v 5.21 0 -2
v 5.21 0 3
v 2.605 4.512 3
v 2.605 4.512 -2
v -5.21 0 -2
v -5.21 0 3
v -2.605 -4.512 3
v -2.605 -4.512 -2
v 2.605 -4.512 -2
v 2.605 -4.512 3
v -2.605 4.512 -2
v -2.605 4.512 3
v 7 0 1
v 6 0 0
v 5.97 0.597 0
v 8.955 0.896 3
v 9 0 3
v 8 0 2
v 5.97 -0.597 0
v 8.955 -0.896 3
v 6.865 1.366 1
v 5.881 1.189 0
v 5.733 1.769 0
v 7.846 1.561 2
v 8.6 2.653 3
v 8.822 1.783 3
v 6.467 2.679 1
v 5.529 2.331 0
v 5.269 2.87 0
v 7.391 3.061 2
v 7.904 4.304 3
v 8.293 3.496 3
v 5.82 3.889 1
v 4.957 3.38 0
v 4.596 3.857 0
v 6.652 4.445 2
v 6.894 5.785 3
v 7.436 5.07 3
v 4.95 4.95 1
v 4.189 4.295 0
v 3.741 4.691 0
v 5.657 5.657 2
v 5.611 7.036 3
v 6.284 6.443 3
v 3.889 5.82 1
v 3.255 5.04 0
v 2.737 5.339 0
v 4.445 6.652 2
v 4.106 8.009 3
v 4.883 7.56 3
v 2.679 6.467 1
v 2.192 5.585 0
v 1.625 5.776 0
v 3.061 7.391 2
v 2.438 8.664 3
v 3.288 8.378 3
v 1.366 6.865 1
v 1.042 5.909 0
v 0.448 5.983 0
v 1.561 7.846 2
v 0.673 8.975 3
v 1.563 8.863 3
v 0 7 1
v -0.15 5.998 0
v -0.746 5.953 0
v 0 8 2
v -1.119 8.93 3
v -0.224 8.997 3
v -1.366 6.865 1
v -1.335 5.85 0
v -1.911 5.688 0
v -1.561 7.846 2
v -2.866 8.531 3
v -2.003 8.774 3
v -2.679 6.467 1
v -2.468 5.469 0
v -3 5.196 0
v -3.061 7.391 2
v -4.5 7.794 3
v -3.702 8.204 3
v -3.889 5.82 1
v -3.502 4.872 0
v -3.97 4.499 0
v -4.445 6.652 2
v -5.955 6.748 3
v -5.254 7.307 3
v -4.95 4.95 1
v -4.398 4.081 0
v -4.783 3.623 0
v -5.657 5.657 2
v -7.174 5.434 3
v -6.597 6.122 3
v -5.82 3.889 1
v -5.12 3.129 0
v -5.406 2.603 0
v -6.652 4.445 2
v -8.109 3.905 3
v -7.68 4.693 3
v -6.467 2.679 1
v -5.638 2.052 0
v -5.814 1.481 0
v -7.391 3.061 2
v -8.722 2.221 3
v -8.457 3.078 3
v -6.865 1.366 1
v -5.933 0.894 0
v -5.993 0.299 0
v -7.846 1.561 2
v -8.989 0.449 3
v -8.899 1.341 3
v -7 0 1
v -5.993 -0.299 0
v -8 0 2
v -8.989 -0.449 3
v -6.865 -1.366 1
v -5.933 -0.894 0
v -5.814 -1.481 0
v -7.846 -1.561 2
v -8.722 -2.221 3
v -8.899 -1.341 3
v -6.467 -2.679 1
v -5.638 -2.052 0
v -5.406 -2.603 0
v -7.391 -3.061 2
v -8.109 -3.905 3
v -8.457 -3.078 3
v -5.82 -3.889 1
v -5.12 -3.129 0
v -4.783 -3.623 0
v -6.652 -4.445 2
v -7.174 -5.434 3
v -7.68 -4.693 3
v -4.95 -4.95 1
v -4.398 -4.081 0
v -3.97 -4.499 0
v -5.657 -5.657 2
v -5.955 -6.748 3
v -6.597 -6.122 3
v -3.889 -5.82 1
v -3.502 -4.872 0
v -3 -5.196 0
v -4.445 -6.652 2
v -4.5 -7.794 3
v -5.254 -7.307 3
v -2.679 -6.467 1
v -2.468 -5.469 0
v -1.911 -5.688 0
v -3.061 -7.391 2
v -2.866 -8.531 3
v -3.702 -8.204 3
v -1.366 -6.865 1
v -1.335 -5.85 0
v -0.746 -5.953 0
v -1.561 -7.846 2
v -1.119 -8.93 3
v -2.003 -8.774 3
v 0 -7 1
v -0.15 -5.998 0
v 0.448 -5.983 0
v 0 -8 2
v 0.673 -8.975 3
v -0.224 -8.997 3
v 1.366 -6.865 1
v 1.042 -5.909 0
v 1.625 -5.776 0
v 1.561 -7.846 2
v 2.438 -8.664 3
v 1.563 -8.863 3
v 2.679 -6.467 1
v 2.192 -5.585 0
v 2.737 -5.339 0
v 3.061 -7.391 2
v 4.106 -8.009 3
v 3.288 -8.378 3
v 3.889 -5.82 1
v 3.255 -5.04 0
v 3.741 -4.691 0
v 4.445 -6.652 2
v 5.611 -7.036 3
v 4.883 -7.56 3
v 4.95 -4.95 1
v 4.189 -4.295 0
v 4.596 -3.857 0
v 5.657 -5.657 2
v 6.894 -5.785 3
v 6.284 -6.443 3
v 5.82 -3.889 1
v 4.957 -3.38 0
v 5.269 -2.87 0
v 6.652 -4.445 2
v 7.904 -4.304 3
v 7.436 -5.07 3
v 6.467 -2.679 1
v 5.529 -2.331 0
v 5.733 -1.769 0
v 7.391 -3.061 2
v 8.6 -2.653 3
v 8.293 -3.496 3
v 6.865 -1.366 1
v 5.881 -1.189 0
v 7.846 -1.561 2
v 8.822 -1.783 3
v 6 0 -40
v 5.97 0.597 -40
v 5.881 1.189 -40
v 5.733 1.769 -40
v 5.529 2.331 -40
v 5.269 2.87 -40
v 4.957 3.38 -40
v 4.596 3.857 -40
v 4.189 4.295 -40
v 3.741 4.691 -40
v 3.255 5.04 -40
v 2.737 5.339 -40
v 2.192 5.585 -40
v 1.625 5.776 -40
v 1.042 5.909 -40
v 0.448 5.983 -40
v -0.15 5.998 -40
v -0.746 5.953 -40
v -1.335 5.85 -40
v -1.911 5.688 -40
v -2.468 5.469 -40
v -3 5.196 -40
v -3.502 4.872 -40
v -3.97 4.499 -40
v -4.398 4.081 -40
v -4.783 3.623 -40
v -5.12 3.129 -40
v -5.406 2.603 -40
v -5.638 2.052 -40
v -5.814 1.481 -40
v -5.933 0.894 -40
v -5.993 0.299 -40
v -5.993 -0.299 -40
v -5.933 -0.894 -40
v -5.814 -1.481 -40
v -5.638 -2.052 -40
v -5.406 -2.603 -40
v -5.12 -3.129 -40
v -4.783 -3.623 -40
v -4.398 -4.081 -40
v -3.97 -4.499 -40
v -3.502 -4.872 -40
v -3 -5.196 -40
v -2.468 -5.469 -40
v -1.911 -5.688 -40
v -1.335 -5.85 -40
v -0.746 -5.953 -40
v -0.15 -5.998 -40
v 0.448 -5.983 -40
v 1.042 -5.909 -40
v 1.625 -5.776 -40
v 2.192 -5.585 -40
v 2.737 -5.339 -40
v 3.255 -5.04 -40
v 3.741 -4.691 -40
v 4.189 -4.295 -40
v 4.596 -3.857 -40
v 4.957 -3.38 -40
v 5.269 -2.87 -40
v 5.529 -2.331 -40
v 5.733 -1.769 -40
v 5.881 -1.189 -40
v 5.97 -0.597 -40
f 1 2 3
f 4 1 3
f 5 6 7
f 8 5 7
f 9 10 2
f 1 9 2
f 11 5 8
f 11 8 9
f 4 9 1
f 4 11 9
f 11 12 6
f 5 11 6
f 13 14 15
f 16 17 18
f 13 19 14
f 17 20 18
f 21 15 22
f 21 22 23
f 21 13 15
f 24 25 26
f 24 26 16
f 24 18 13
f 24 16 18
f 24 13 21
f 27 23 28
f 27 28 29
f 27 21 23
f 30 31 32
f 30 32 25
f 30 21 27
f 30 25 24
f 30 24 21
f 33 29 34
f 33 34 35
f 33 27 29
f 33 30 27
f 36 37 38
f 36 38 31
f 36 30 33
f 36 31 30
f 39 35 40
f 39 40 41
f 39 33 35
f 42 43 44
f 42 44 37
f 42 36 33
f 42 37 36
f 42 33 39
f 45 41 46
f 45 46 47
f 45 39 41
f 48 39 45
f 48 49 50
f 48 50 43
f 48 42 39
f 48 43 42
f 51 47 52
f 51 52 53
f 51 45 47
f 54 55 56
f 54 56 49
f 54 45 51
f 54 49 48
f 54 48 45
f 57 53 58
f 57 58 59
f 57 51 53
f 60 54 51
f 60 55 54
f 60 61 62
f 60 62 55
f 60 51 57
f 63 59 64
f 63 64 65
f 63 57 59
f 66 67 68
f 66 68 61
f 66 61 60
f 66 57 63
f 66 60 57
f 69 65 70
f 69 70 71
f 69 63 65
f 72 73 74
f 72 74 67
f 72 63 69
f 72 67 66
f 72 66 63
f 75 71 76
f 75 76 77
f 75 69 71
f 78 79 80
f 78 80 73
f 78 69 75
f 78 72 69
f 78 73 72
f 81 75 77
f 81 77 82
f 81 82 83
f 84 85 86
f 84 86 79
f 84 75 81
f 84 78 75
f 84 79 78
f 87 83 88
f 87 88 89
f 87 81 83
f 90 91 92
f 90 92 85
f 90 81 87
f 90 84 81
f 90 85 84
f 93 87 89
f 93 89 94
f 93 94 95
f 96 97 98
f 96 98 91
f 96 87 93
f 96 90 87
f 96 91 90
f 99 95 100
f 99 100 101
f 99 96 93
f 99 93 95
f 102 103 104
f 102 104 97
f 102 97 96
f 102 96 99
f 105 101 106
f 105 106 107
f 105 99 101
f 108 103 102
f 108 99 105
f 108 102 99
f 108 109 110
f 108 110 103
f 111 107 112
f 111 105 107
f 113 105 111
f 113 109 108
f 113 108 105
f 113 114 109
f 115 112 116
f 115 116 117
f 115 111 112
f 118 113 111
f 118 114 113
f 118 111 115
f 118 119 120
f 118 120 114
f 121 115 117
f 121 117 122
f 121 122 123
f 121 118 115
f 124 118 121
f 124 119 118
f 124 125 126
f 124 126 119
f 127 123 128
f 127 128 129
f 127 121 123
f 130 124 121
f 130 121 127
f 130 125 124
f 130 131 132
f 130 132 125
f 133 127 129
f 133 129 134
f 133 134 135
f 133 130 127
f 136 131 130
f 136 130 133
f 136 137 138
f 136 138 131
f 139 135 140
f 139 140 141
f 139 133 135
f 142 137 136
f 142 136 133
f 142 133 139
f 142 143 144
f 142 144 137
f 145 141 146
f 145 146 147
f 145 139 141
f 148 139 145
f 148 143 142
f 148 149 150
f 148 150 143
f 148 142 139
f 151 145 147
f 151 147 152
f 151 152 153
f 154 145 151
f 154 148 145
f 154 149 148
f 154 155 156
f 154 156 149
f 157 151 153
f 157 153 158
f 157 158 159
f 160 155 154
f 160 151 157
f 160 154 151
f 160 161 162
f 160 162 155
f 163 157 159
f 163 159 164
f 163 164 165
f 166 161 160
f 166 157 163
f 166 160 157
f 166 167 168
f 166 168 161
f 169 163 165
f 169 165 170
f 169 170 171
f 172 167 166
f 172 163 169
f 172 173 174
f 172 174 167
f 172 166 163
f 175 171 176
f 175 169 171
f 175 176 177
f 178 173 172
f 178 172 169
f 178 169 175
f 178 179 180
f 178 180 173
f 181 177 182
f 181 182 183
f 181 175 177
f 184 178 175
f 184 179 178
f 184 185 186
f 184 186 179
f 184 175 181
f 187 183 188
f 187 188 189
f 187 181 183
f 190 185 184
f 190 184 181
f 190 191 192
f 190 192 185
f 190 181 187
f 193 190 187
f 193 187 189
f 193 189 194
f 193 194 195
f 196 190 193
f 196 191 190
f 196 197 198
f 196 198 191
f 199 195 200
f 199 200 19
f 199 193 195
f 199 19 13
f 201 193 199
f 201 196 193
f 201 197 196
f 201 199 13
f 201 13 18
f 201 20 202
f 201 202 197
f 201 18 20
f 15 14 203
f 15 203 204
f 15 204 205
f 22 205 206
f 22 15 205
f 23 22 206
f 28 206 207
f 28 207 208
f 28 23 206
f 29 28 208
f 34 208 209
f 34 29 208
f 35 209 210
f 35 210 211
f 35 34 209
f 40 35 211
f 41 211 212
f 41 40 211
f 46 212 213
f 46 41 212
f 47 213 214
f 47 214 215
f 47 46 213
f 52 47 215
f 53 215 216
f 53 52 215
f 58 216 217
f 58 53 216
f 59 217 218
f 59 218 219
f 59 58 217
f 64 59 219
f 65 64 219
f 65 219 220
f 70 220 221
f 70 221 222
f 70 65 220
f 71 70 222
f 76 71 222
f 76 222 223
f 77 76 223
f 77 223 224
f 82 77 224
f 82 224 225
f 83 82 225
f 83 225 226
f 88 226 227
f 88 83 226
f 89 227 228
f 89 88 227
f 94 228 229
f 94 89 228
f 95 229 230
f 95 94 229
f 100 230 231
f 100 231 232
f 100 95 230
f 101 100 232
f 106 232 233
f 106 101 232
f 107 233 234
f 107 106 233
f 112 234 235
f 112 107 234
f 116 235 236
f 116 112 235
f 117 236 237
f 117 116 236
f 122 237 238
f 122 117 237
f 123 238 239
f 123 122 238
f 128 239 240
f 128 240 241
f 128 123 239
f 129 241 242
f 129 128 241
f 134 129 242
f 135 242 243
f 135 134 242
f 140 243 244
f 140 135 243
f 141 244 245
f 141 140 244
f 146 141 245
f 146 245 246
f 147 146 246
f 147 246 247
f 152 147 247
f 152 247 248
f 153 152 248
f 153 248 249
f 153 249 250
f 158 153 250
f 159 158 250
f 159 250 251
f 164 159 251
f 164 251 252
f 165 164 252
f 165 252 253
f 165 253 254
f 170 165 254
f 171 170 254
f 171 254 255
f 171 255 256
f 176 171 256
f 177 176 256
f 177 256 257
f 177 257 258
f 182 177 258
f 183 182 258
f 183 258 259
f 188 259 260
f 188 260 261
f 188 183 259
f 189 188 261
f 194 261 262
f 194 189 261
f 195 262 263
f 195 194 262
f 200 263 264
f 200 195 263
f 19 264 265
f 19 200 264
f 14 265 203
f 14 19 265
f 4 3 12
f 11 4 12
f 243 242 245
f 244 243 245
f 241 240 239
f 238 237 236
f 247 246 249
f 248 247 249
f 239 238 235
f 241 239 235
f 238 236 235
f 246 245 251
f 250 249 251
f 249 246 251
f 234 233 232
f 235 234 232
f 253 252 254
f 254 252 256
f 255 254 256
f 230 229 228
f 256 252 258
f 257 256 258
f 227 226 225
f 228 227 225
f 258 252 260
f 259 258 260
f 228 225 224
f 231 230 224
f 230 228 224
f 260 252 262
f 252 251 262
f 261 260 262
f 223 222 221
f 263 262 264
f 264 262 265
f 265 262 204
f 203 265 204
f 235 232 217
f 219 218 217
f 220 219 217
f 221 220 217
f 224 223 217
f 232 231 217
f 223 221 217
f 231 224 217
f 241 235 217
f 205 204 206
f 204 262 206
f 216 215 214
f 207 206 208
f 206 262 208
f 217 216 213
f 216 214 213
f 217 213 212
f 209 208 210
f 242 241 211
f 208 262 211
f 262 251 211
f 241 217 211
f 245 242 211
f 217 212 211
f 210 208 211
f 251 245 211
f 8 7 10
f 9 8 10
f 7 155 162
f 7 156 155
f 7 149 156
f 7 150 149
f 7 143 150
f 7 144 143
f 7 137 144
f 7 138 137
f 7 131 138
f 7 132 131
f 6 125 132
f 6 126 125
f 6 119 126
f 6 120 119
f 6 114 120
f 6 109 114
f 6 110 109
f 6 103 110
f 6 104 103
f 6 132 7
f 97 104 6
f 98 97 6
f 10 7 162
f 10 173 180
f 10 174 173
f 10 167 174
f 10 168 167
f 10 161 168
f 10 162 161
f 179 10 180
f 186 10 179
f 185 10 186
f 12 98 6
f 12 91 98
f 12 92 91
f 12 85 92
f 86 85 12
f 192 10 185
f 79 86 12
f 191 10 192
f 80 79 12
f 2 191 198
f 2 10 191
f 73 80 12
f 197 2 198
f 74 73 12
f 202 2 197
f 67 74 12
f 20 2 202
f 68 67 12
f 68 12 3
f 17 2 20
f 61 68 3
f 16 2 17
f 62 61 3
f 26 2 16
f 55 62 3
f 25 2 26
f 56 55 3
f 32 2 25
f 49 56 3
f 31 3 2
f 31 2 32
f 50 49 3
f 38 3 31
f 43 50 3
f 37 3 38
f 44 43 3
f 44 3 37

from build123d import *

# Parameters (mm, degrees)
F0_R     = 6
F1_DEPTH = 3
F1_TAPER = -45
F2_DEPTH = 40
F4_DEPTH = 5


with BuildPart() as f1:
    # F0 (on Top) → F1 (new body)
    with BuildSketch(Plane.XY):
        Circle(F0_R)
    extrude(amount=F1_DEPTH, taper=F1_TAPER)

    # F0 (on Top) → F2 (join)
    with BuildSketch(Plane.XY):
        Circle(F0_R)
    extrude(amount=-F2_DEPTH)

    # F3 (on face) → F4 (cut)
    with BuildSketch(Plane.XY.offset(3)):
        Polygon((2.6050036522, -4.5119986795), (5.2100073044, 0), (2.6050036522, 4.5119986795), (-2.6050036522, 4.5119986795), (-5.2100073044, 0), (-2.6050036522, -4.5119986795), align=None)
    extrude(amount=-F4_DEPTH, mode=Mode.SUBTRACT)


solid = f1.part
